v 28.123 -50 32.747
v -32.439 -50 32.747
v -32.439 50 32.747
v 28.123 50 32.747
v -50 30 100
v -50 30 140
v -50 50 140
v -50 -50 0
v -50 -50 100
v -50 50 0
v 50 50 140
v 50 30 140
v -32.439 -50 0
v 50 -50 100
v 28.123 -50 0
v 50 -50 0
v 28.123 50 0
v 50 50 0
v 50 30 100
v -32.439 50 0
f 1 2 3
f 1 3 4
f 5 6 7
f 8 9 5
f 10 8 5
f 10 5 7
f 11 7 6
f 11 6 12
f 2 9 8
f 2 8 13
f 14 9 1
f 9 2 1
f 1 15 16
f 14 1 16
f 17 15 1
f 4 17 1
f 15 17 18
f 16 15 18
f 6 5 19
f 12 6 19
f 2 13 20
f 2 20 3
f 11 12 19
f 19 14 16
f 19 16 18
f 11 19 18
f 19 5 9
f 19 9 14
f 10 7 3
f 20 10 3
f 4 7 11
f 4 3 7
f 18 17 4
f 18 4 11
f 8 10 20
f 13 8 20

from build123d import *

# Parameters (mm, degrees)
F0_W     = 100
F0_H     = 100
F1_DEPTH = 100
F2_W     = 100
F2_H     = 20
F3_DEPTH = 40
F4_W     = 60.561549
F4_H     = 32.747179
F5_DEPTH = 100.001


with BuildPart() as f1:
    # F0 (on Top) → F1 (new body)
    with BuildSketch(Plane.XY):
        Rectangle(F0_W, F0_H)
    extrude(amount=F1_DEPTH)

    # F2 (on face) → F3 (join)
    with BuildSketch(Plane.XY.offset(100)):
        with Locations((0, 40)):
            Rectangle(F2_W, F2_H)
    extrude(amount=F3_DEPTH)

    # F4 (on face) → F5 (cut, through all)
    with BuildSketch(Plane.XZ.offset(50)):
        with Locations((-2.157872, 16.373589)):
            Rectangle(F4_W, F4_H)
    extrude(amount=-F5_DEPTH, mode=Mode.SUBTRACT)


solid = f1.part
